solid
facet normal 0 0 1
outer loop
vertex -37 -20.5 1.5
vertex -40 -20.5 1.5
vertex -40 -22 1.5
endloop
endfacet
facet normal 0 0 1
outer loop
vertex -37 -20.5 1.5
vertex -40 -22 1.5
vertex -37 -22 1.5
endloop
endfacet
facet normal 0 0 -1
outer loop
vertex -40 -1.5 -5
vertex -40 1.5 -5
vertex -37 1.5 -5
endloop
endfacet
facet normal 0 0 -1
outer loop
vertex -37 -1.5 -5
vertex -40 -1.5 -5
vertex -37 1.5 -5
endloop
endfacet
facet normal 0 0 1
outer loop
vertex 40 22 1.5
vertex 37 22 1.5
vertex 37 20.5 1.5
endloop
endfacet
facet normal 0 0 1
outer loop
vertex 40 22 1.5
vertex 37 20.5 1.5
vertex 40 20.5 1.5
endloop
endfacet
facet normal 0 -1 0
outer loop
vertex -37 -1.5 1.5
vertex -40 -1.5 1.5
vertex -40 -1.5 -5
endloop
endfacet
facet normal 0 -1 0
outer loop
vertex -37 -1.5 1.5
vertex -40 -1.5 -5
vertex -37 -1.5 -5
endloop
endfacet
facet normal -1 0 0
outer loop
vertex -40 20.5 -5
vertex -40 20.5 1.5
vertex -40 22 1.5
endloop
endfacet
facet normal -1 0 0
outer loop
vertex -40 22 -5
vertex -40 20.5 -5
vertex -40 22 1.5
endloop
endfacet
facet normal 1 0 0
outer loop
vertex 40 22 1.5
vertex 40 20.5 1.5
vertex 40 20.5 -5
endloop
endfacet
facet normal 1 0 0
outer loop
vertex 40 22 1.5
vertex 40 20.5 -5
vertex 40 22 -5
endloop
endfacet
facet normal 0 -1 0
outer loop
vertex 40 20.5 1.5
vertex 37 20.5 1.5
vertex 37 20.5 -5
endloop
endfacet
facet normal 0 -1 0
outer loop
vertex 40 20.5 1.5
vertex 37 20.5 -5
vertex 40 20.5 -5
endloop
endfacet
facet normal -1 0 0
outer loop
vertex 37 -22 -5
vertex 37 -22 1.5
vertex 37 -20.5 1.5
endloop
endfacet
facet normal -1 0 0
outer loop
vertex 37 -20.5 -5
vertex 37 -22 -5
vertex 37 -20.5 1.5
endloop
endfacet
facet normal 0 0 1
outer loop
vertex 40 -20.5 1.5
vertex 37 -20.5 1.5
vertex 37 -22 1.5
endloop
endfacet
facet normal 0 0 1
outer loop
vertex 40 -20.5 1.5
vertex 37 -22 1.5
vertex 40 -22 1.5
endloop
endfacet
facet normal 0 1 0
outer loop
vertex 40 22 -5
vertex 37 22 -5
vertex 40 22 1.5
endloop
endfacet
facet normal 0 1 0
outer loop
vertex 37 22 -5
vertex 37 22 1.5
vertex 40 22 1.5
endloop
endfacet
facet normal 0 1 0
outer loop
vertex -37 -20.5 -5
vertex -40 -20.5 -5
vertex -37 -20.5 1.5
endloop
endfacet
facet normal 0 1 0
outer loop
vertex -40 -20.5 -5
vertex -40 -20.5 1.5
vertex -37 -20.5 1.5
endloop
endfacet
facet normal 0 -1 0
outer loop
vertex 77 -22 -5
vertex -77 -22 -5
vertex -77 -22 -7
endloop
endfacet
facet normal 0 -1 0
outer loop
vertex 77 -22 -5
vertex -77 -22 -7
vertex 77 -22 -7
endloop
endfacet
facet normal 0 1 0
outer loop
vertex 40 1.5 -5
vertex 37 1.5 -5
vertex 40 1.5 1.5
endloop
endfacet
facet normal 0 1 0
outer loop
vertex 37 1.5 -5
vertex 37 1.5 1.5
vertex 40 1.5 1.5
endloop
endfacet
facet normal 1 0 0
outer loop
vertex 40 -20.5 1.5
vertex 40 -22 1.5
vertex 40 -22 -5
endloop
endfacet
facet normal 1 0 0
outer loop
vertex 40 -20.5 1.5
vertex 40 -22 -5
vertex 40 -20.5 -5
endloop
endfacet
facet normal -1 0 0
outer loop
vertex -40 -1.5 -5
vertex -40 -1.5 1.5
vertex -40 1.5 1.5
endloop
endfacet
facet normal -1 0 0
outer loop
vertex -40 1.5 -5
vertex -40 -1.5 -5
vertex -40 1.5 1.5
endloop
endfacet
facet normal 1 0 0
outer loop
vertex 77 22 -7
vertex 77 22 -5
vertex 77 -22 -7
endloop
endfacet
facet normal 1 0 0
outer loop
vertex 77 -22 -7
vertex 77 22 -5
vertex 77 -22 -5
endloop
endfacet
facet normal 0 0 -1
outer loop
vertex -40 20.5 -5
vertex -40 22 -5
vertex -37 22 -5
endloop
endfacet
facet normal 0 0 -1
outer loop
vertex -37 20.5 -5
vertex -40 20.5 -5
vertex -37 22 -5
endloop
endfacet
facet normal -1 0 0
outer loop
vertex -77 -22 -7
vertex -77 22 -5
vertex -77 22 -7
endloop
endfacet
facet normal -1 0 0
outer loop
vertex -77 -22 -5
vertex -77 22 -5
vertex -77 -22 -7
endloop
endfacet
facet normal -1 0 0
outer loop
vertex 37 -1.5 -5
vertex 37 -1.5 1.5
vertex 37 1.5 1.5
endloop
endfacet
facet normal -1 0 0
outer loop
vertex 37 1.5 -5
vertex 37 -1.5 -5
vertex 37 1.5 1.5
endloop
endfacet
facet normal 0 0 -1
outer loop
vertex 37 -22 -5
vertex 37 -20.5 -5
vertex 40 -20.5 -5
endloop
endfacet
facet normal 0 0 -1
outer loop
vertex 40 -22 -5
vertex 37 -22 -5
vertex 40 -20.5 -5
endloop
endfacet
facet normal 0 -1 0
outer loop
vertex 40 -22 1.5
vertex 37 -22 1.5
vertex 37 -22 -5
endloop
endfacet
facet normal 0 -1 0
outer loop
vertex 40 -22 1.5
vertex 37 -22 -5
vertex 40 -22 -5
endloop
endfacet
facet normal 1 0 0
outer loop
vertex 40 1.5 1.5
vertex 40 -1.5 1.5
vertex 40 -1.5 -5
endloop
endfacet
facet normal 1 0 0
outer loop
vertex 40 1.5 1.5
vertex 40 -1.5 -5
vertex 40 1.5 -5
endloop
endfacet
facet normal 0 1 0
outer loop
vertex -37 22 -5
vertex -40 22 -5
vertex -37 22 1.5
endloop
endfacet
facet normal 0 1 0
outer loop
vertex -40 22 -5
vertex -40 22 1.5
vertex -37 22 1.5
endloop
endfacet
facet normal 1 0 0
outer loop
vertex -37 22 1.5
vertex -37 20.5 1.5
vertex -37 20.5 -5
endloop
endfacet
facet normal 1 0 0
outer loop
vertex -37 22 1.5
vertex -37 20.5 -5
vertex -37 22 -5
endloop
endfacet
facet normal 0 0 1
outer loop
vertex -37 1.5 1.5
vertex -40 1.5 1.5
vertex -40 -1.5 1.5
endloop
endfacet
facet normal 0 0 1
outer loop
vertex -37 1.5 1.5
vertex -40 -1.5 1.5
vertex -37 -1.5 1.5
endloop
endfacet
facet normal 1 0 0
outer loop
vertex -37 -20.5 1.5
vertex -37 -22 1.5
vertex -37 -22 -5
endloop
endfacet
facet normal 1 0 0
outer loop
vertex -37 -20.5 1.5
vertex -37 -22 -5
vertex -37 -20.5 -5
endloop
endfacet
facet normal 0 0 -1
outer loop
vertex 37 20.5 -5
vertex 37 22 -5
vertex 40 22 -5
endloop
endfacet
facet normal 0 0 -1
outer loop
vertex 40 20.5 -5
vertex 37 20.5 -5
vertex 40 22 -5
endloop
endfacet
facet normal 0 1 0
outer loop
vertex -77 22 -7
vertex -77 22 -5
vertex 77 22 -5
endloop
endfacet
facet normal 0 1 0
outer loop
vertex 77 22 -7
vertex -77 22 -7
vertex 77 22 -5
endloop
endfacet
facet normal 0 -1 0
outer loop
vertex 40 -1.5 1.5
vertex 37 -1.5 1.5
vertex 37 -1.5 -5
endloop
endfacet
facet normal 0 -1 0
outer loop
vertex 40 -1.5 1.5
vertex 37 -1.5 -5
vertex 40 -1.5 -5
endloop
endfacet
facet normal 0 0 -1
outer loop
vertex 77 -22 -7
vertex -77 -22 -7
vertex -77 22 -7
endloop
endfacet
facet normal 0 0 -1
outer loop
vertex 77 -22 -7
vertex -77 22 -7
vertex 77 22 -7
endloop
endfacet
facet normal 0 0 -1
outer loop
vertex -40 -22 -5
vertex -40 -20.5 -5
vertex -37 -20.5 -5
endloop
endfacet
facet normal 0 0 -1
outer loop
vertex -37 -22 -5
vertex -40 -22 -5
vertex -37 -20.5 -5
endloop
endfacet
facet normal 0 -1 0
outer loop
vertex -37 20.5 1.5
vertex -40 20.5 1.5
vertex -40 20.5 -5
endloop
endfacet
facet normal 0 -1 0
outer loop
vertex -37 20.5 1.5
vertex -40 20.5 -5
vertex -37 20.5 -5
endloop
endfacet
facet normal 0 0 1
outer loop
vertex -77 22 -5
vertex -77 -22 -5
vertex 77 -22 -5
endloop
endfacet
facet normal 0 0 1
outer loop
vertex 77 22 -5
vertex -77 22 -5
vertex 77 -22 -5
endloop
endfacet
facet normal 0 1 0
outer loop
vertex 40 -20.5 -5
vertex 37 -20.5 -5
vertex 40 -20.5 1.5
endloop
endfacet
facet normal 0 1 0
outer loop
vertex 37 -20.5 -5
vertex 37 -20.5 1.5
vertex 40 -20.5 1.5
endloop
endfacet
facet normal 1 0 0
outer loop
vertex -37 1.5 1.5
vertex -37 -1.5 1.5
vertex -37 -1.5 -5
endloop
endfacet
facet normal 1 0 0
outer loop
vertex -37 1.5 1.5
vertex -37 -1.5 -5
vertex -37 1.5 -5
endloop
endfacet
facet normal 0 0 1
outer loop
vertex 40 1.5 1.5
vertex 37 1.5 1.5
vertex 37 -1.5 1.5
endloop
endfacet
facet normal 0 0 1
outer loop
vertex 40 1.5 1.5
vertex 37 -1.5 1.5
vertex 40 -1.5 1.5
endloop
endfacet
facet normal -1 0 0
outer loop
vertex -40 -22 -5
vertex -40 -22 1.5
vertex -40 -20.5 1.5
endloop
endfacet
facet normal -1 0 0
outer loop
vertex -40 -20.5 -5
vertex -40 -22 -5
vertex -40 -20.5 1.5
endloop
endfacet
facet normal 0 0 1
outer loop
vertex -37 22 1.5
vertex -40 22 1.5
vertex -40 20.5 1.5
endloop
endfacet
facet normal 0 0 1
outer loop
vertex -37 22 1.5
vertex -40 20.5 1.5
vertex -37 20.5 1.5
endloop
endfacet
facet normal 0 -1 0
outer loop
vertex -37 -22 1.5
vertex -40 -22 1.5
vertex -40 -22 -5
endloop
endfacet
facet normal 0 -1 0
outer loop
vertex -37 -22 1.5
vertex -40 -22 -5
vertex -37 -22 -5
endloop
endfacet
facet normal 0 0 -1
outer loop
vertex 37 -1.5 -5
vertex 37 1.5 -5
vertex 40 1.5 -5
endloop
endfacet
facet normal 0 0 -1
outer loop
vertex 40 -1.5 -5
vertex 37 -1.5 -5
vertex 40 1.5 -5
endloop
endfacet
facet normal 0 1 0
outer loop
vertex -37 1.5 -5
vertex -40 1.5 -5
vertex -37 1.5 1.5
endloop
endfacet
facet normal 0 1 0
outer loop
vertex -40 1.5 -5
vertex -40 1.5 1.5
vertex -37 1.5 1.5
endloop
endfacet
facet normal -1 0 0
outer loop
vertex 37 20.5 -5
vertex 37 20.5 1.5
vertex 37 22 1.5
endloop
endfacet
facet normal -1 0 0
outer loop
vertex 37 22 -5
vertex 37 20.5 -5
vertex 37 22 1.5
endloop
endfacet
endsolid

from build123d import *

# Parameters (mm, degrees)
F0_W          = 3
F0_H          = 3
F0_H_2        = 1.5
F1_DEPTH      = 1.5
F1_DEPTH_BACK = 5
F2_W          = 154
F2_H          = 44
F3_DEPTH      = 2


with BuildPart() as f1:
    # F0 (on Top) → F1 (new body, two sides)
    with BuildSketch(Plane.XY) as f1_sk:
        with Locations((-38.5, 0)):
            Rectangle(F0_W, F0_H)
        with Locations((-38.5, -21.25)):
            Rectangle(F0_W, F0_H_2)
        with Locations((38.5, 21.25)):
            Rectangle(F0_W, F0_H_2)
        with Locations((-38.5, 21.25)):
            Rectangle(F0_W, F0_H_2)
        with Locations((38.5, 0)):
            Rectangle(F0_W, F0_H)
        with Locations((38.5, -21.25)):
            Rectangle(F0_W, F0_H_2)
    extrude(amount=F1_DEPTH)
    extrude(f1_sk.sketch, amount=-F1_DEPTH_BACK)


with BuildPart() as f3:
    # F2 (on face) → F3 (new body)
    with BuildSketch(Plane(origin=(0, 0, -5), x_dir=(1, 0, 0), z_dir=(0, 0, -1))):
        Rectangle(F2_W, F2_H)
    extrude(amount=F3_DEPTH)


solid = Compound([f1.part, f3.part])
